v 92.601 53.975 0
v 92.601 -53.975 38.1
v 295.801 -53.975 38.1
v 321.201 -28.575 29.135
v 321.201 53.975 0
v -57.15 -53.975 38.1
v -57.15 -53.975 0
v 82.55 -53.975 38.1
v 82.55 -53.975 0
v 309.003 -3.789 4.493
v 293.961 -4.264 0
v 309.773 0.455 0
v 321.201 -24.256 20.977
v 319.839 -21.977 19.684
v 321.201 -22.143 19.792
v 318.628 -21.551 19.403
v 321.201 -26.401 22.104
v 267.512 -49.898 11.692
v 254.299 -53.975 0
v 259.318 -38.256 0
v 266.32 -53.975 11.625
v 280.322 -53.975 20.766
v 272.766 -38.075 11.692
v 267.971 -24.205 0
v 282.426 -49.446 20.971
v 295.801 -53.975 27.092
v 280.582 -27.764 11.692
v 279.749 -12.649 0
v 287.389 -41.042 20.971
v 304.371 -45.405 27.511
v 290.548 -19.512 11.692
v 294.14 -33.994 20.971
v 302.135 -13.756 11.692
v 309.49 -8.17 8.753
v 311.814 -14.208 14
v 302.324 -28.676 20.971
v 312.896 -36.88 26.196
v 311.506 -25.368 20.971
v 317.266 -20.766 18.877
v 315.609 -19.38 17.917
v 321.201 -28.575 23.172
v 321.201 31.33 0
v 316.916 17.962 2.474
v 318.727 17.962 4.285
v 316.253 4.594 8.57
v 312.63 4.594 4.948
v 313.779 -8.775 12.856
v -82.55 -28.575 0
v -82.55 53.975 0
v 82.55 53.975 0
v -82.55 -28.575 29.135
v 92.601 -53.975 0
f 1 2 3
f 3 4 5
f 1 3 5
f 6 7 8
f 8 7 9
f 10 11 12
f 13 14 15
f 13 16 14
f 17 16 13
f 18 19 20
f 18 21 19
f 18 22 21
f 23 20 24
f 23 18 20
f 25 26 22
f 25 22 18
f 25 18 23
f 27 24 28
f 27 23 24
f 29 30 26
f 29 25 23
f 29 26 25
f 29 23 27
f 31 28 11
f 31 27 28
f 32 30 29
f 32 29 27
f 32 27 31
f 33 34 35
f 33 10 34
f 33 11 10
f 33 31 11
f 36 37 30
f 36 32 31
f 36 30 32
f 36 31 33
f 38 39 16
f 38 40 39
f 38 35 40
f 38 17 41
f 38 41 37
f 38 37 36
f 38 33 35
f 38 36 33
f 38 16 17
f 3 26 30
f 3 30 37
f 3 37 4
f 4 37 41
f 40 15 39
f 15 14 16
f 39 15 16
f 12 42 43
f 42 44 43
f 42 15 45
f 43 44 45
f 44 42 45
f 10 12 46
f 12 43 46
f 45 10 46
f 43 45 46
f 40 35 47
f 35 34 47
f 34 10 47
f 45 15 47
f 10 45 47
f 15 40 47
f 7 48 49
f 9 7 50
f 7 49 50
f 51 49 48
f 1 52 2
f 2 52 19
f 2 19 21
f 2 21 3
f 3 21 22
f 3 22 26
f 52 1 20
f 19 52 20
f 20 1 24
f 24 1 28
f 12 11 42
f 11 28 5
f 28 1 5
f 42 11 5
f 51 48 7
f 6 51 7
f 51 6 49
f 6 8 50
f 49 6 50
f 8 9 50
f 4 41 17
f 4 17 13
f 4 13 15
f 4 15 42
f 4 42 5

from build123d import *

# Parameters (mm, degrees)
F1_DEPTH  = 38.1
F3_DEPTH  = 165.1
F4_W      = 228.6
F4_H      = 107.95
F5_DEPTH  = 38.1
F7_DEPTH  = 228.6
F13_DEPTH = 101.6


with BuildPart() as f1:
    # F0 (on Top) → F1 (new body)
    with BuildSketch(Plane.XY):
        Polygon((82.55, 53.975), (-82.55, 53.975), (-82.55, -28.575), (-57.15, -28.575), (-57.15, -53.975), (82.55, -53.975), align=None)
        Polygon((-57.15, -28.575), (-82.55, -28.575), (-57.15, -53.975), align=None)
    extrude(amount=F1_DEPTH)

    # F2 (on face) → F3 (cut, through all)
    with BuildSketch(Plane.YZ.offset(82.55)):
        Polygon((-53.975, 38.1), (53.975, 0), (53.975, 38.1), align=None)
    extrude(amount=-F3_DEPTH, mode=Mode.SUBTRACT)


with BuildPart() as f5:
    # F4 (on Top) → F5 (new body)
    with BuildSketch(Plane.XY):
        with Locations((206.9008294222, 0)):
            Rectangle(F4_W, F4_H)
    extrude(amount=F5_DEPTH)

    # F6 (on face) → F7 (cut, through all)
    with BuildSketch(Plane.YZ.offset(321.2008294222)):
        Polygon((-53.975, 38.1), (53.975, 0), (53.975, 38.1), align=None)
    extrude(amount=-F7_DEPTH, mode=Mode.SUBTRACT)

    # F8 (on face) → F9 (revolve, cut)
    with BuildSketch(Plane.YZ.offset(321.2008294222)):
        with BuildLine():
            ThreePointArc((-53.975, 30.8381810245), (-60.3086546229, 31.5217522469), (-66.675, 31.75))
            Line((-66.675, 31.75), (-66.675, -146.05))
            ThreePointArc((-66.675, -146.05), (-3.8132071525, -120.0117928475), (22.225, -57.15))
            ThreePointArc((22.225, -57.15), (16.8622939051, -26.7406177798), (1.4211636218, 0))
            Line((1.4211636218, 0), (-53.975, 0))
            Line((-53.975, 0), (-53.975, 30.8381810245))
        make_face()
        with BuildLine():
            ThreePointArc((1.4211636218, 0), (-23.4343551595, 20.5253283468), (-53.975, 30.8381810245))
            Line((-53.975, 30.8381810245), (-53.975, 0))
            Line((-53.975, 0), (1.4211636218, 0))
        make_face()
    revolve(axis=Axis((321.2008294222, -66.675, -57.15), (0, 0, -1)), mode=Mode.SUBTRACT)

    # F10 (on face) → F11 (revolve, cut)
    with BuildSketch(Plane.YZ.offset(321.2008294222)):
        with BuildLine():
            Line((31.3303954899, 0), (-22.1433918333, 19.7924841949))
            ThreePointArc((-22.1433918333, 19.7924841949), (-9.4981746932, 10.9236413587), (1.4211636217, 0))
            Line((1.4211636217, 0), (31.3303954899, 0))
        make_face()
        with BuildLine():
            ThreePointArc((1.4211636217, 0), (-9.4981746932, 10.9236413587), (-22.1433918333, 19.7924841949))
            Line((-22.1433918333, 19.7924841949), (-22.1433918333, 0))
            Line((-22.1433918333, 0), (1.4211636217, 0))
        make_face()
    revolve(axis=Axis((321.2008294222, 4.5935018283, 0), (0, -1, 0)), mode=Mode.SUBTRACT)

    # F12 (on face) → F13 (cut)
    with BuildSketch(Plane(origin=(0, 0, 0), x_dir=(1, 0, 0), z_dir=(0, 0, -1))):
        Polygon((321.2008294222, 28.575), (321.2008294222, 53.975), (295.8008294222, 53.975), align=None)
    extrude(amount=-F13_DEPTH, mode=Mode.SUBTRACT)


solid = Compound([f1.part, f5.part])
